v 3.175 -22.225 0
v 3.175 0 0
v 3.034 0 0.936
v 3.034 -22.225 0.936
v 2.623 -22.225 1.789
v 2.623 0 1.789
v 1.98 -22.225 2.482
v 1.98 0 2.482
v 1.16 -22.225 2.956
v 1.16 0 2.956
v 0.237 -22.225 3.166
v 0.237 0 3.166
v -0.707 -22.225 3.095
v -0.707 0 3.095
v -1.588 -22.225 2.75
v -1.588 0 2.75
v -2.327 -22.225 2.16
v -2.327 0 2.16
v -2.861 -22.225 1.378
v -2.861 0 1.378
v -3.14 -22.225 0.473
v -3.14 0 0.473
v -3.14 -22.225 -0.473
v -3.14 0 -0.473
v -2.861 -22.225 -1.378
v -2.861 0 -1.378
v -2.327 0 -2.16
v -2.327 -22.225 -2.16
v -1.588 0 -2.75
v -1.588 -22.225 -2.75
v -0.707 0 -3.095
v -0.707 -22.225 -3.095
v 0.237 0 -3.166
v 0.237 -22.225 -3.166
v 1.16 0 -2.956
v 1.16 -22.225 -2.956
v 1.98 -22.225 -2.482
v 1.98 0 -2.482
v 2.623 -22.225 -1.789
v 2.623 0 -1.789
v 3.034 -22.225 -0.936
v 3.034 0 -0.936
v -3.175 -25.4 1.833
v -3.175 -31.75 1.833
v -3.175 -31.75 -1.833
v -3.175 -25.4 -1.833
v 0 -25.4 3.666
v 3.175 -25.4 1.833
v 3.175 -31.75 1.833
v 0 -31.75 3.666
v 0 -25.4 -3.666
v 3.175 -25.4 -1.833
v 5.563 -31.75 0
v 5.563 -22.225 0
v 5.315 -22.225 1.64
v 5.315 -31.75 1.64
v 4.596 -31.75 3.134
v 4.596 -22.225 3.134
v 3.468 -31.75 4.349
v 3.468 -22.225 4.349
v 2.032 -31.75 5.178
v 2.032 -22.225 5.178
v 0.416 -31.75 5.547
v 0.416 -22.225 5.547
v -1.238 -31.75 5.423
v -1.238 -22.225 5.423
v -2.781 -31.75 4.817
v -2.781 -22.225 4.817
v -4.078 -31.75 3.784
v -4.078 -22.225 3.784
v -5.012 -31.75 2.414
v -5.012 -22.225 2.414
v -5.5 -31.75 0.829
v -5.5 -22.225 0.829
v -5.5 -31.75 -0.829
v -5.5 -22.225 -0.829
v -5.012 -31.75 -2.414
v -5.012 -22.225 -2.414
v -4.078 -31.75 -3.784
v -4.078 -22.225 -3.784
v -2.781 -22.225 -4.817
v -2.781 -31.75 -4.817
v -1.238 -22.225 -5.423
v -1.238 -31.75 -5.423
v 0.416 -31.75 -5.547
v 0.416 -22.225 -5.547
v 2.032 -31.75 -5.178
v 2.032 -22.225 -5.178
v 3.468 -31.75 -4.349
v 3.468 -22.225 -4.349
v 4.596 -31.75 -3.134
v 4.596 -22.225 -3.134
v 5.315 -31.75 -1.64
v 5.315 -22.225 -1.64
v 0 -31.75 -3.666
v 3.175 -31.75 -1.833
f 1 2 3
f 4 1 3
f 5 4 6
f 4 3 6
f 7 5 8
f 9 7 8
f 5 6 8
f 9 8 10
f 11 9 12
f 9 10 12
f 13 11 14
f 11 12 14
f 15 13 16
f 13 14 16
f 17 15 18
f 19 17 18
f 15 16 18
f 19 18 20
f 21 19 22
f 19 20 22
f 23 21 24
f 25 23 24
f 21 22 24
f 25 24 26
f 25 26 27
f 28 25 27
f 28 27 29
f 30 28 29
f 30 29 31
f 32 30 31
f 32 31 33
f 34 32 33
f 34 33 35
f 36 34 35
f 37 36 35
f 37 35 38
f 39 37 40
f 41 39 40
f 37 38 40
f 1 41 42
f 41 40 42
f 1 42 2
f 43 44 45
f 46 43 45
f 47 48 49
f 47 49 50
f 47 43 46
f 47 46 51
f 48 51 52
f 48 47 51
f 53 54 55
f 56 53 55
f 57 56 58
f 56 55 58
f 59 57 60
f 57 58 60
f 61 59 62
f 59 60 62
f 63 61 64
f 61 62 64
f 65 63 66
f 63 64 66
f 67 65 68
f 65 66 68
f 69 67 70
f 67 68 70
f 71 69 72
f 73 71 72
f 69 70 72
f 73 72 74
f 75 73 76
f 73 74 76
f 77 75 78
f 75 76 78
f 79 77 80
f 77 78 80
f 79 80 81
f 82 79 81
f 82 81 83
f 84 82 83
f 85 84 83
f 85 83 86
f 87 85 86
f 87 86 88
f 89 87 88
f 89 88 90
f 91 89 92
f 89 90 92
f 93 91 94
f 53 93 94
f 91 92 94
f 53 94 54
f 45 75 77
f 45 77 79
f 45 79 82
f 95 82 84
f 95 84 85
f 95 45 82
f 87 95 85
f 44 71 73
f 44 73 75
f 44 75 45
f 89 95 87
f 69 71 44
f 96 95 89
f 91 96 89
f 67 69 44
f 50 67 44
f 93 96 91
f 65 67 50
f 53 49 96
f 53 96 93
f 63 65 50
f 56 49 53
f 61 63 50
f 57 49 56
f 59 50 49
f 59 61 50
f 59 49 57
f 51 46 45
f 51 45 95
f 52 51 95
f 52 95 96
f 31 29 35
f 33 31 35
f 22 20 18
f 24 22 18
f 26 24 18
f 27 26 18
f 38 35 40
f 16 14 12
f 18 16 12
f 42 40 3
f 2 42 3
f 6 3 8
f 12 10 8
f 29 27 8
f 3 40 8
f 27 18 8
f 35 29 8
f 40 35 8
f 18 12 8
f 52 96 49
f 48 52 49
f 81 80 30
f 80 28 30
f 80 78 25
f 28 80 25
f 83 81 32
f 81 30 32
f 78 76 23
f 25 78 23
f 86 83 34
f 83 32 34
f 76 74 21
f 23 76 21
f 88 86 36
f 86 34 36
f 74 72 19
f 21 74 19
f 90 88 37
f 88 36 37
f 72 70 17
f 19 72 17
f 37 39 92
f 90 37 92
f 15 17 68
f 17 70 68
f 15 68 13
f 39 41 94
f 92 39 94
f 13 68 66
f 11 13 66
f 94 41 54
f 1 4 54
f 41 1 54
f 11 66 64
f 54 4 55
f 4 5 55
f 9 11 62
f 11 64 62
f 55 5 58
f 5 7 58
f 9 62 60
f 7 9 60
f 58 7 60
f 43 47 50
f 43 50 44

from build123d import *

# Parameters (mm, degrees)
F0_R     = 3.175
F1_DEPTH = 22.225
F3_R     = 5.5626
F4_DEPTH = 9.525
F6_DEPTH = 6.35


with BuildPart() as f1:
    # F0 (on Front) → F1 (new body)
    with BuildSketch(Plane.XZ):
        Circle(F0_R)
    extrude(amount=F1_DEPTH)

    # F3 (on face) → F4 (join)
    with BuildSketch(Plane.XZ.offset(22.225)):
        Circle(F3_R)
    extrude(amount=F4_DEPTH)

    # F5 (on face) → F6 (cut)
    with BuildSketch(Plane.XZ.offset(31.75)):
        Polygon((3.175, 1.833087), (0, 3.666174), (-3.175, 1.833087), (-3.175, -1.833087), (0, -3.666174), (3.175, -1.833087), align=None)
    extrude(amount=-F6_DEPTH, mode=Mode.SUBTRACT)


solid = f1.part
